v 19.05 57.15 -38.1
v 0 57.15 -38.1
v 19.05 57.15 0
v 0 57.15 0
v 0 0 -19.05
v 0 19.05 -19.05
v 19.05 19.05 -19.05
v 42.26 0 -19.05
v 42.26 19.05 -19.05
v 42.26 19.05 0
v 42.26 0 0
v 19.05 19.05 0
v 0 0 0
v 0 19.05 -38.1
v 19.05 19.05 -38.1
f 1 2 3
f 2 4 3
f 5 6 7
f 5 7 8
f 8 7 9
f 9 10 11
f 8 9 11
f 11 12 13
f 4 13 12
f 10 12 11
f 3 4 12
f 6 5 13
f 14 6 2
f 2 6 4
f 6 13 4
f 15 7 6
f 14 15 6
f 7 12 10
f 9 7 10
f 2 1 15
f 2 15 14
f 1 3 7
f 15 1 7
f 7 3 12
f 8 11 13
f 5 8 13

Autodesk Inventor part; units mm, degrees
ref_plane "YZ Plane" through (0, 0, 0) normal (1, 0, 0) x (0, 1, 0)
ref_plane "XZ Plane" through (0, 0, 0) normal (0, 1, 0) x (-1, 0, 0)
ref_plane "XY Plane" through (0, 0, 0) normal (0, 0, 1) x (1, 0, 0)
sketch "Sketch1" plane through (0, 0, 0) normal (0, 0, 1) x (1, 0, 0)
  line L0 (0, 19.05) -> (0, 0)
  line L1 (0, 19.05) -> (42.2604, 19.05)
  line L2 (42.2604, 19.05) -> (42.2604, 0)
  line L3 (42.2604, 0) -> (0, 0)
  line L4 (0, 19.05) -> (0, 57.15)
  line L5 (0, 57.15) -> (19.05, 57.15)
  line L6 (19.05, 57.15) -> (19.05, 19.05)
  line L7 (0, 38.1) -> (19.05, 38.1)
  dimension "d0" = 19.05
  dimension "d1" = 19.05
  dimension "d2" = 38.1
extrude "Extrusion1" add sketch "Sketch1" against normal blind 19.05
sketch "straight 3 cube" plane through (0, 0, 0) normal (0, 0, 1) x (1, 0, 0)
  line L0 (19.05, 19.05) -> (42.2604, 19.05) projected
  line L1 (19.05, 19.05) -> (0, 19.05)
  line L2 (0, 0) -> (0, 57.15) projected
  line L3 (19.05, 19.05) -> (19.05, 38.1)
  line L4 (19.05, 57.15) -> (19.05, 19.05) projected
  line L5 (19.05, 38.1) -> (0, 38.1)
  line L6 (19.05, 19.05) -> (0, 19.05)
  line L7 (19.05, 19.05) -> (0, 19.05)
  line L8 (19.05, 19.05) -> (19.05, 38.1)
  line L9 (0, 38.1) -> (19.05, 38.1)
  line L10 (19.05, 38.1) -> (0, 38.1)
  line L11 (0, 38.1) -> (0, 19.05)
  line L12 (0, 19.05) -> (19.05, 19.05)
  line L13 (19.05, 19.05) -> (19.05, 38.1)
  line L14 (19.05, 19.05) -> (0, 19.05)
sketch "Sketch3" plane through (0, 0, -19.05) normal (0, 0, -1) x (-1, 0, 0)
  line L0 (-19.05, 19.05) -> (-42.2604, 19.05) projected
  line L1 (-19.05, 19.05) -> (0, 19.05)
  line L2 (0, 0) -> (0, 57.15) projected
  line L3 (0, 19.05) -> (0, 57.15)
  line L4 (0, 57.15) -> (-19.05, 57.15) projected
  line L5 (0, 57.15) -> (-19.05, 57.15)
  line L6 (-19.05, 57.15) -> (-19.05, 19.05) projected
  line L7 (-19.05, 57.15) -> (-19.05, 19.05)
extrude "Extrusion2" add sketch "Sketch3" along normal blind 19.05
sketch "Sketch4" plane through (19.05, 19.05, 0) normal (1, 0, 0) x (0, 0, -1)
  point P0 (0, -19.05)
sketch "Sketch5" plane through (0, 0, 0) normal (0, 0, 1) x (1, 0, 0)
  point P0 (0, 0)
equation "\"d1\" = cube"
equation "\"d2\" = 2 * cube"
equation "\"d3\" = cube"
equation "\"d5\" = cube"
equation "\"BendRadius\" = Thickness"
equation "\"BendReliefWidth\" = Thickness"
equation "\"BendReliefDepth\" = 0.5 * Thickness"
equation "\"CornerReliefSize\" = 4 * Thickness"
equation "\"MinimumRemnant\" = 2 * Thickness"
equation "\"TransitionRadius\" = BendRadius"
equation "\"JacobiRadiusSize\" = BendRadius"
equation "\"GapSize\" = Thickness"
equation "\"cube\" = 19.05"
equation "\"Thickness\" = 3.048"
properties part number "IED7_Sun_PuzzleCubeOrange"
